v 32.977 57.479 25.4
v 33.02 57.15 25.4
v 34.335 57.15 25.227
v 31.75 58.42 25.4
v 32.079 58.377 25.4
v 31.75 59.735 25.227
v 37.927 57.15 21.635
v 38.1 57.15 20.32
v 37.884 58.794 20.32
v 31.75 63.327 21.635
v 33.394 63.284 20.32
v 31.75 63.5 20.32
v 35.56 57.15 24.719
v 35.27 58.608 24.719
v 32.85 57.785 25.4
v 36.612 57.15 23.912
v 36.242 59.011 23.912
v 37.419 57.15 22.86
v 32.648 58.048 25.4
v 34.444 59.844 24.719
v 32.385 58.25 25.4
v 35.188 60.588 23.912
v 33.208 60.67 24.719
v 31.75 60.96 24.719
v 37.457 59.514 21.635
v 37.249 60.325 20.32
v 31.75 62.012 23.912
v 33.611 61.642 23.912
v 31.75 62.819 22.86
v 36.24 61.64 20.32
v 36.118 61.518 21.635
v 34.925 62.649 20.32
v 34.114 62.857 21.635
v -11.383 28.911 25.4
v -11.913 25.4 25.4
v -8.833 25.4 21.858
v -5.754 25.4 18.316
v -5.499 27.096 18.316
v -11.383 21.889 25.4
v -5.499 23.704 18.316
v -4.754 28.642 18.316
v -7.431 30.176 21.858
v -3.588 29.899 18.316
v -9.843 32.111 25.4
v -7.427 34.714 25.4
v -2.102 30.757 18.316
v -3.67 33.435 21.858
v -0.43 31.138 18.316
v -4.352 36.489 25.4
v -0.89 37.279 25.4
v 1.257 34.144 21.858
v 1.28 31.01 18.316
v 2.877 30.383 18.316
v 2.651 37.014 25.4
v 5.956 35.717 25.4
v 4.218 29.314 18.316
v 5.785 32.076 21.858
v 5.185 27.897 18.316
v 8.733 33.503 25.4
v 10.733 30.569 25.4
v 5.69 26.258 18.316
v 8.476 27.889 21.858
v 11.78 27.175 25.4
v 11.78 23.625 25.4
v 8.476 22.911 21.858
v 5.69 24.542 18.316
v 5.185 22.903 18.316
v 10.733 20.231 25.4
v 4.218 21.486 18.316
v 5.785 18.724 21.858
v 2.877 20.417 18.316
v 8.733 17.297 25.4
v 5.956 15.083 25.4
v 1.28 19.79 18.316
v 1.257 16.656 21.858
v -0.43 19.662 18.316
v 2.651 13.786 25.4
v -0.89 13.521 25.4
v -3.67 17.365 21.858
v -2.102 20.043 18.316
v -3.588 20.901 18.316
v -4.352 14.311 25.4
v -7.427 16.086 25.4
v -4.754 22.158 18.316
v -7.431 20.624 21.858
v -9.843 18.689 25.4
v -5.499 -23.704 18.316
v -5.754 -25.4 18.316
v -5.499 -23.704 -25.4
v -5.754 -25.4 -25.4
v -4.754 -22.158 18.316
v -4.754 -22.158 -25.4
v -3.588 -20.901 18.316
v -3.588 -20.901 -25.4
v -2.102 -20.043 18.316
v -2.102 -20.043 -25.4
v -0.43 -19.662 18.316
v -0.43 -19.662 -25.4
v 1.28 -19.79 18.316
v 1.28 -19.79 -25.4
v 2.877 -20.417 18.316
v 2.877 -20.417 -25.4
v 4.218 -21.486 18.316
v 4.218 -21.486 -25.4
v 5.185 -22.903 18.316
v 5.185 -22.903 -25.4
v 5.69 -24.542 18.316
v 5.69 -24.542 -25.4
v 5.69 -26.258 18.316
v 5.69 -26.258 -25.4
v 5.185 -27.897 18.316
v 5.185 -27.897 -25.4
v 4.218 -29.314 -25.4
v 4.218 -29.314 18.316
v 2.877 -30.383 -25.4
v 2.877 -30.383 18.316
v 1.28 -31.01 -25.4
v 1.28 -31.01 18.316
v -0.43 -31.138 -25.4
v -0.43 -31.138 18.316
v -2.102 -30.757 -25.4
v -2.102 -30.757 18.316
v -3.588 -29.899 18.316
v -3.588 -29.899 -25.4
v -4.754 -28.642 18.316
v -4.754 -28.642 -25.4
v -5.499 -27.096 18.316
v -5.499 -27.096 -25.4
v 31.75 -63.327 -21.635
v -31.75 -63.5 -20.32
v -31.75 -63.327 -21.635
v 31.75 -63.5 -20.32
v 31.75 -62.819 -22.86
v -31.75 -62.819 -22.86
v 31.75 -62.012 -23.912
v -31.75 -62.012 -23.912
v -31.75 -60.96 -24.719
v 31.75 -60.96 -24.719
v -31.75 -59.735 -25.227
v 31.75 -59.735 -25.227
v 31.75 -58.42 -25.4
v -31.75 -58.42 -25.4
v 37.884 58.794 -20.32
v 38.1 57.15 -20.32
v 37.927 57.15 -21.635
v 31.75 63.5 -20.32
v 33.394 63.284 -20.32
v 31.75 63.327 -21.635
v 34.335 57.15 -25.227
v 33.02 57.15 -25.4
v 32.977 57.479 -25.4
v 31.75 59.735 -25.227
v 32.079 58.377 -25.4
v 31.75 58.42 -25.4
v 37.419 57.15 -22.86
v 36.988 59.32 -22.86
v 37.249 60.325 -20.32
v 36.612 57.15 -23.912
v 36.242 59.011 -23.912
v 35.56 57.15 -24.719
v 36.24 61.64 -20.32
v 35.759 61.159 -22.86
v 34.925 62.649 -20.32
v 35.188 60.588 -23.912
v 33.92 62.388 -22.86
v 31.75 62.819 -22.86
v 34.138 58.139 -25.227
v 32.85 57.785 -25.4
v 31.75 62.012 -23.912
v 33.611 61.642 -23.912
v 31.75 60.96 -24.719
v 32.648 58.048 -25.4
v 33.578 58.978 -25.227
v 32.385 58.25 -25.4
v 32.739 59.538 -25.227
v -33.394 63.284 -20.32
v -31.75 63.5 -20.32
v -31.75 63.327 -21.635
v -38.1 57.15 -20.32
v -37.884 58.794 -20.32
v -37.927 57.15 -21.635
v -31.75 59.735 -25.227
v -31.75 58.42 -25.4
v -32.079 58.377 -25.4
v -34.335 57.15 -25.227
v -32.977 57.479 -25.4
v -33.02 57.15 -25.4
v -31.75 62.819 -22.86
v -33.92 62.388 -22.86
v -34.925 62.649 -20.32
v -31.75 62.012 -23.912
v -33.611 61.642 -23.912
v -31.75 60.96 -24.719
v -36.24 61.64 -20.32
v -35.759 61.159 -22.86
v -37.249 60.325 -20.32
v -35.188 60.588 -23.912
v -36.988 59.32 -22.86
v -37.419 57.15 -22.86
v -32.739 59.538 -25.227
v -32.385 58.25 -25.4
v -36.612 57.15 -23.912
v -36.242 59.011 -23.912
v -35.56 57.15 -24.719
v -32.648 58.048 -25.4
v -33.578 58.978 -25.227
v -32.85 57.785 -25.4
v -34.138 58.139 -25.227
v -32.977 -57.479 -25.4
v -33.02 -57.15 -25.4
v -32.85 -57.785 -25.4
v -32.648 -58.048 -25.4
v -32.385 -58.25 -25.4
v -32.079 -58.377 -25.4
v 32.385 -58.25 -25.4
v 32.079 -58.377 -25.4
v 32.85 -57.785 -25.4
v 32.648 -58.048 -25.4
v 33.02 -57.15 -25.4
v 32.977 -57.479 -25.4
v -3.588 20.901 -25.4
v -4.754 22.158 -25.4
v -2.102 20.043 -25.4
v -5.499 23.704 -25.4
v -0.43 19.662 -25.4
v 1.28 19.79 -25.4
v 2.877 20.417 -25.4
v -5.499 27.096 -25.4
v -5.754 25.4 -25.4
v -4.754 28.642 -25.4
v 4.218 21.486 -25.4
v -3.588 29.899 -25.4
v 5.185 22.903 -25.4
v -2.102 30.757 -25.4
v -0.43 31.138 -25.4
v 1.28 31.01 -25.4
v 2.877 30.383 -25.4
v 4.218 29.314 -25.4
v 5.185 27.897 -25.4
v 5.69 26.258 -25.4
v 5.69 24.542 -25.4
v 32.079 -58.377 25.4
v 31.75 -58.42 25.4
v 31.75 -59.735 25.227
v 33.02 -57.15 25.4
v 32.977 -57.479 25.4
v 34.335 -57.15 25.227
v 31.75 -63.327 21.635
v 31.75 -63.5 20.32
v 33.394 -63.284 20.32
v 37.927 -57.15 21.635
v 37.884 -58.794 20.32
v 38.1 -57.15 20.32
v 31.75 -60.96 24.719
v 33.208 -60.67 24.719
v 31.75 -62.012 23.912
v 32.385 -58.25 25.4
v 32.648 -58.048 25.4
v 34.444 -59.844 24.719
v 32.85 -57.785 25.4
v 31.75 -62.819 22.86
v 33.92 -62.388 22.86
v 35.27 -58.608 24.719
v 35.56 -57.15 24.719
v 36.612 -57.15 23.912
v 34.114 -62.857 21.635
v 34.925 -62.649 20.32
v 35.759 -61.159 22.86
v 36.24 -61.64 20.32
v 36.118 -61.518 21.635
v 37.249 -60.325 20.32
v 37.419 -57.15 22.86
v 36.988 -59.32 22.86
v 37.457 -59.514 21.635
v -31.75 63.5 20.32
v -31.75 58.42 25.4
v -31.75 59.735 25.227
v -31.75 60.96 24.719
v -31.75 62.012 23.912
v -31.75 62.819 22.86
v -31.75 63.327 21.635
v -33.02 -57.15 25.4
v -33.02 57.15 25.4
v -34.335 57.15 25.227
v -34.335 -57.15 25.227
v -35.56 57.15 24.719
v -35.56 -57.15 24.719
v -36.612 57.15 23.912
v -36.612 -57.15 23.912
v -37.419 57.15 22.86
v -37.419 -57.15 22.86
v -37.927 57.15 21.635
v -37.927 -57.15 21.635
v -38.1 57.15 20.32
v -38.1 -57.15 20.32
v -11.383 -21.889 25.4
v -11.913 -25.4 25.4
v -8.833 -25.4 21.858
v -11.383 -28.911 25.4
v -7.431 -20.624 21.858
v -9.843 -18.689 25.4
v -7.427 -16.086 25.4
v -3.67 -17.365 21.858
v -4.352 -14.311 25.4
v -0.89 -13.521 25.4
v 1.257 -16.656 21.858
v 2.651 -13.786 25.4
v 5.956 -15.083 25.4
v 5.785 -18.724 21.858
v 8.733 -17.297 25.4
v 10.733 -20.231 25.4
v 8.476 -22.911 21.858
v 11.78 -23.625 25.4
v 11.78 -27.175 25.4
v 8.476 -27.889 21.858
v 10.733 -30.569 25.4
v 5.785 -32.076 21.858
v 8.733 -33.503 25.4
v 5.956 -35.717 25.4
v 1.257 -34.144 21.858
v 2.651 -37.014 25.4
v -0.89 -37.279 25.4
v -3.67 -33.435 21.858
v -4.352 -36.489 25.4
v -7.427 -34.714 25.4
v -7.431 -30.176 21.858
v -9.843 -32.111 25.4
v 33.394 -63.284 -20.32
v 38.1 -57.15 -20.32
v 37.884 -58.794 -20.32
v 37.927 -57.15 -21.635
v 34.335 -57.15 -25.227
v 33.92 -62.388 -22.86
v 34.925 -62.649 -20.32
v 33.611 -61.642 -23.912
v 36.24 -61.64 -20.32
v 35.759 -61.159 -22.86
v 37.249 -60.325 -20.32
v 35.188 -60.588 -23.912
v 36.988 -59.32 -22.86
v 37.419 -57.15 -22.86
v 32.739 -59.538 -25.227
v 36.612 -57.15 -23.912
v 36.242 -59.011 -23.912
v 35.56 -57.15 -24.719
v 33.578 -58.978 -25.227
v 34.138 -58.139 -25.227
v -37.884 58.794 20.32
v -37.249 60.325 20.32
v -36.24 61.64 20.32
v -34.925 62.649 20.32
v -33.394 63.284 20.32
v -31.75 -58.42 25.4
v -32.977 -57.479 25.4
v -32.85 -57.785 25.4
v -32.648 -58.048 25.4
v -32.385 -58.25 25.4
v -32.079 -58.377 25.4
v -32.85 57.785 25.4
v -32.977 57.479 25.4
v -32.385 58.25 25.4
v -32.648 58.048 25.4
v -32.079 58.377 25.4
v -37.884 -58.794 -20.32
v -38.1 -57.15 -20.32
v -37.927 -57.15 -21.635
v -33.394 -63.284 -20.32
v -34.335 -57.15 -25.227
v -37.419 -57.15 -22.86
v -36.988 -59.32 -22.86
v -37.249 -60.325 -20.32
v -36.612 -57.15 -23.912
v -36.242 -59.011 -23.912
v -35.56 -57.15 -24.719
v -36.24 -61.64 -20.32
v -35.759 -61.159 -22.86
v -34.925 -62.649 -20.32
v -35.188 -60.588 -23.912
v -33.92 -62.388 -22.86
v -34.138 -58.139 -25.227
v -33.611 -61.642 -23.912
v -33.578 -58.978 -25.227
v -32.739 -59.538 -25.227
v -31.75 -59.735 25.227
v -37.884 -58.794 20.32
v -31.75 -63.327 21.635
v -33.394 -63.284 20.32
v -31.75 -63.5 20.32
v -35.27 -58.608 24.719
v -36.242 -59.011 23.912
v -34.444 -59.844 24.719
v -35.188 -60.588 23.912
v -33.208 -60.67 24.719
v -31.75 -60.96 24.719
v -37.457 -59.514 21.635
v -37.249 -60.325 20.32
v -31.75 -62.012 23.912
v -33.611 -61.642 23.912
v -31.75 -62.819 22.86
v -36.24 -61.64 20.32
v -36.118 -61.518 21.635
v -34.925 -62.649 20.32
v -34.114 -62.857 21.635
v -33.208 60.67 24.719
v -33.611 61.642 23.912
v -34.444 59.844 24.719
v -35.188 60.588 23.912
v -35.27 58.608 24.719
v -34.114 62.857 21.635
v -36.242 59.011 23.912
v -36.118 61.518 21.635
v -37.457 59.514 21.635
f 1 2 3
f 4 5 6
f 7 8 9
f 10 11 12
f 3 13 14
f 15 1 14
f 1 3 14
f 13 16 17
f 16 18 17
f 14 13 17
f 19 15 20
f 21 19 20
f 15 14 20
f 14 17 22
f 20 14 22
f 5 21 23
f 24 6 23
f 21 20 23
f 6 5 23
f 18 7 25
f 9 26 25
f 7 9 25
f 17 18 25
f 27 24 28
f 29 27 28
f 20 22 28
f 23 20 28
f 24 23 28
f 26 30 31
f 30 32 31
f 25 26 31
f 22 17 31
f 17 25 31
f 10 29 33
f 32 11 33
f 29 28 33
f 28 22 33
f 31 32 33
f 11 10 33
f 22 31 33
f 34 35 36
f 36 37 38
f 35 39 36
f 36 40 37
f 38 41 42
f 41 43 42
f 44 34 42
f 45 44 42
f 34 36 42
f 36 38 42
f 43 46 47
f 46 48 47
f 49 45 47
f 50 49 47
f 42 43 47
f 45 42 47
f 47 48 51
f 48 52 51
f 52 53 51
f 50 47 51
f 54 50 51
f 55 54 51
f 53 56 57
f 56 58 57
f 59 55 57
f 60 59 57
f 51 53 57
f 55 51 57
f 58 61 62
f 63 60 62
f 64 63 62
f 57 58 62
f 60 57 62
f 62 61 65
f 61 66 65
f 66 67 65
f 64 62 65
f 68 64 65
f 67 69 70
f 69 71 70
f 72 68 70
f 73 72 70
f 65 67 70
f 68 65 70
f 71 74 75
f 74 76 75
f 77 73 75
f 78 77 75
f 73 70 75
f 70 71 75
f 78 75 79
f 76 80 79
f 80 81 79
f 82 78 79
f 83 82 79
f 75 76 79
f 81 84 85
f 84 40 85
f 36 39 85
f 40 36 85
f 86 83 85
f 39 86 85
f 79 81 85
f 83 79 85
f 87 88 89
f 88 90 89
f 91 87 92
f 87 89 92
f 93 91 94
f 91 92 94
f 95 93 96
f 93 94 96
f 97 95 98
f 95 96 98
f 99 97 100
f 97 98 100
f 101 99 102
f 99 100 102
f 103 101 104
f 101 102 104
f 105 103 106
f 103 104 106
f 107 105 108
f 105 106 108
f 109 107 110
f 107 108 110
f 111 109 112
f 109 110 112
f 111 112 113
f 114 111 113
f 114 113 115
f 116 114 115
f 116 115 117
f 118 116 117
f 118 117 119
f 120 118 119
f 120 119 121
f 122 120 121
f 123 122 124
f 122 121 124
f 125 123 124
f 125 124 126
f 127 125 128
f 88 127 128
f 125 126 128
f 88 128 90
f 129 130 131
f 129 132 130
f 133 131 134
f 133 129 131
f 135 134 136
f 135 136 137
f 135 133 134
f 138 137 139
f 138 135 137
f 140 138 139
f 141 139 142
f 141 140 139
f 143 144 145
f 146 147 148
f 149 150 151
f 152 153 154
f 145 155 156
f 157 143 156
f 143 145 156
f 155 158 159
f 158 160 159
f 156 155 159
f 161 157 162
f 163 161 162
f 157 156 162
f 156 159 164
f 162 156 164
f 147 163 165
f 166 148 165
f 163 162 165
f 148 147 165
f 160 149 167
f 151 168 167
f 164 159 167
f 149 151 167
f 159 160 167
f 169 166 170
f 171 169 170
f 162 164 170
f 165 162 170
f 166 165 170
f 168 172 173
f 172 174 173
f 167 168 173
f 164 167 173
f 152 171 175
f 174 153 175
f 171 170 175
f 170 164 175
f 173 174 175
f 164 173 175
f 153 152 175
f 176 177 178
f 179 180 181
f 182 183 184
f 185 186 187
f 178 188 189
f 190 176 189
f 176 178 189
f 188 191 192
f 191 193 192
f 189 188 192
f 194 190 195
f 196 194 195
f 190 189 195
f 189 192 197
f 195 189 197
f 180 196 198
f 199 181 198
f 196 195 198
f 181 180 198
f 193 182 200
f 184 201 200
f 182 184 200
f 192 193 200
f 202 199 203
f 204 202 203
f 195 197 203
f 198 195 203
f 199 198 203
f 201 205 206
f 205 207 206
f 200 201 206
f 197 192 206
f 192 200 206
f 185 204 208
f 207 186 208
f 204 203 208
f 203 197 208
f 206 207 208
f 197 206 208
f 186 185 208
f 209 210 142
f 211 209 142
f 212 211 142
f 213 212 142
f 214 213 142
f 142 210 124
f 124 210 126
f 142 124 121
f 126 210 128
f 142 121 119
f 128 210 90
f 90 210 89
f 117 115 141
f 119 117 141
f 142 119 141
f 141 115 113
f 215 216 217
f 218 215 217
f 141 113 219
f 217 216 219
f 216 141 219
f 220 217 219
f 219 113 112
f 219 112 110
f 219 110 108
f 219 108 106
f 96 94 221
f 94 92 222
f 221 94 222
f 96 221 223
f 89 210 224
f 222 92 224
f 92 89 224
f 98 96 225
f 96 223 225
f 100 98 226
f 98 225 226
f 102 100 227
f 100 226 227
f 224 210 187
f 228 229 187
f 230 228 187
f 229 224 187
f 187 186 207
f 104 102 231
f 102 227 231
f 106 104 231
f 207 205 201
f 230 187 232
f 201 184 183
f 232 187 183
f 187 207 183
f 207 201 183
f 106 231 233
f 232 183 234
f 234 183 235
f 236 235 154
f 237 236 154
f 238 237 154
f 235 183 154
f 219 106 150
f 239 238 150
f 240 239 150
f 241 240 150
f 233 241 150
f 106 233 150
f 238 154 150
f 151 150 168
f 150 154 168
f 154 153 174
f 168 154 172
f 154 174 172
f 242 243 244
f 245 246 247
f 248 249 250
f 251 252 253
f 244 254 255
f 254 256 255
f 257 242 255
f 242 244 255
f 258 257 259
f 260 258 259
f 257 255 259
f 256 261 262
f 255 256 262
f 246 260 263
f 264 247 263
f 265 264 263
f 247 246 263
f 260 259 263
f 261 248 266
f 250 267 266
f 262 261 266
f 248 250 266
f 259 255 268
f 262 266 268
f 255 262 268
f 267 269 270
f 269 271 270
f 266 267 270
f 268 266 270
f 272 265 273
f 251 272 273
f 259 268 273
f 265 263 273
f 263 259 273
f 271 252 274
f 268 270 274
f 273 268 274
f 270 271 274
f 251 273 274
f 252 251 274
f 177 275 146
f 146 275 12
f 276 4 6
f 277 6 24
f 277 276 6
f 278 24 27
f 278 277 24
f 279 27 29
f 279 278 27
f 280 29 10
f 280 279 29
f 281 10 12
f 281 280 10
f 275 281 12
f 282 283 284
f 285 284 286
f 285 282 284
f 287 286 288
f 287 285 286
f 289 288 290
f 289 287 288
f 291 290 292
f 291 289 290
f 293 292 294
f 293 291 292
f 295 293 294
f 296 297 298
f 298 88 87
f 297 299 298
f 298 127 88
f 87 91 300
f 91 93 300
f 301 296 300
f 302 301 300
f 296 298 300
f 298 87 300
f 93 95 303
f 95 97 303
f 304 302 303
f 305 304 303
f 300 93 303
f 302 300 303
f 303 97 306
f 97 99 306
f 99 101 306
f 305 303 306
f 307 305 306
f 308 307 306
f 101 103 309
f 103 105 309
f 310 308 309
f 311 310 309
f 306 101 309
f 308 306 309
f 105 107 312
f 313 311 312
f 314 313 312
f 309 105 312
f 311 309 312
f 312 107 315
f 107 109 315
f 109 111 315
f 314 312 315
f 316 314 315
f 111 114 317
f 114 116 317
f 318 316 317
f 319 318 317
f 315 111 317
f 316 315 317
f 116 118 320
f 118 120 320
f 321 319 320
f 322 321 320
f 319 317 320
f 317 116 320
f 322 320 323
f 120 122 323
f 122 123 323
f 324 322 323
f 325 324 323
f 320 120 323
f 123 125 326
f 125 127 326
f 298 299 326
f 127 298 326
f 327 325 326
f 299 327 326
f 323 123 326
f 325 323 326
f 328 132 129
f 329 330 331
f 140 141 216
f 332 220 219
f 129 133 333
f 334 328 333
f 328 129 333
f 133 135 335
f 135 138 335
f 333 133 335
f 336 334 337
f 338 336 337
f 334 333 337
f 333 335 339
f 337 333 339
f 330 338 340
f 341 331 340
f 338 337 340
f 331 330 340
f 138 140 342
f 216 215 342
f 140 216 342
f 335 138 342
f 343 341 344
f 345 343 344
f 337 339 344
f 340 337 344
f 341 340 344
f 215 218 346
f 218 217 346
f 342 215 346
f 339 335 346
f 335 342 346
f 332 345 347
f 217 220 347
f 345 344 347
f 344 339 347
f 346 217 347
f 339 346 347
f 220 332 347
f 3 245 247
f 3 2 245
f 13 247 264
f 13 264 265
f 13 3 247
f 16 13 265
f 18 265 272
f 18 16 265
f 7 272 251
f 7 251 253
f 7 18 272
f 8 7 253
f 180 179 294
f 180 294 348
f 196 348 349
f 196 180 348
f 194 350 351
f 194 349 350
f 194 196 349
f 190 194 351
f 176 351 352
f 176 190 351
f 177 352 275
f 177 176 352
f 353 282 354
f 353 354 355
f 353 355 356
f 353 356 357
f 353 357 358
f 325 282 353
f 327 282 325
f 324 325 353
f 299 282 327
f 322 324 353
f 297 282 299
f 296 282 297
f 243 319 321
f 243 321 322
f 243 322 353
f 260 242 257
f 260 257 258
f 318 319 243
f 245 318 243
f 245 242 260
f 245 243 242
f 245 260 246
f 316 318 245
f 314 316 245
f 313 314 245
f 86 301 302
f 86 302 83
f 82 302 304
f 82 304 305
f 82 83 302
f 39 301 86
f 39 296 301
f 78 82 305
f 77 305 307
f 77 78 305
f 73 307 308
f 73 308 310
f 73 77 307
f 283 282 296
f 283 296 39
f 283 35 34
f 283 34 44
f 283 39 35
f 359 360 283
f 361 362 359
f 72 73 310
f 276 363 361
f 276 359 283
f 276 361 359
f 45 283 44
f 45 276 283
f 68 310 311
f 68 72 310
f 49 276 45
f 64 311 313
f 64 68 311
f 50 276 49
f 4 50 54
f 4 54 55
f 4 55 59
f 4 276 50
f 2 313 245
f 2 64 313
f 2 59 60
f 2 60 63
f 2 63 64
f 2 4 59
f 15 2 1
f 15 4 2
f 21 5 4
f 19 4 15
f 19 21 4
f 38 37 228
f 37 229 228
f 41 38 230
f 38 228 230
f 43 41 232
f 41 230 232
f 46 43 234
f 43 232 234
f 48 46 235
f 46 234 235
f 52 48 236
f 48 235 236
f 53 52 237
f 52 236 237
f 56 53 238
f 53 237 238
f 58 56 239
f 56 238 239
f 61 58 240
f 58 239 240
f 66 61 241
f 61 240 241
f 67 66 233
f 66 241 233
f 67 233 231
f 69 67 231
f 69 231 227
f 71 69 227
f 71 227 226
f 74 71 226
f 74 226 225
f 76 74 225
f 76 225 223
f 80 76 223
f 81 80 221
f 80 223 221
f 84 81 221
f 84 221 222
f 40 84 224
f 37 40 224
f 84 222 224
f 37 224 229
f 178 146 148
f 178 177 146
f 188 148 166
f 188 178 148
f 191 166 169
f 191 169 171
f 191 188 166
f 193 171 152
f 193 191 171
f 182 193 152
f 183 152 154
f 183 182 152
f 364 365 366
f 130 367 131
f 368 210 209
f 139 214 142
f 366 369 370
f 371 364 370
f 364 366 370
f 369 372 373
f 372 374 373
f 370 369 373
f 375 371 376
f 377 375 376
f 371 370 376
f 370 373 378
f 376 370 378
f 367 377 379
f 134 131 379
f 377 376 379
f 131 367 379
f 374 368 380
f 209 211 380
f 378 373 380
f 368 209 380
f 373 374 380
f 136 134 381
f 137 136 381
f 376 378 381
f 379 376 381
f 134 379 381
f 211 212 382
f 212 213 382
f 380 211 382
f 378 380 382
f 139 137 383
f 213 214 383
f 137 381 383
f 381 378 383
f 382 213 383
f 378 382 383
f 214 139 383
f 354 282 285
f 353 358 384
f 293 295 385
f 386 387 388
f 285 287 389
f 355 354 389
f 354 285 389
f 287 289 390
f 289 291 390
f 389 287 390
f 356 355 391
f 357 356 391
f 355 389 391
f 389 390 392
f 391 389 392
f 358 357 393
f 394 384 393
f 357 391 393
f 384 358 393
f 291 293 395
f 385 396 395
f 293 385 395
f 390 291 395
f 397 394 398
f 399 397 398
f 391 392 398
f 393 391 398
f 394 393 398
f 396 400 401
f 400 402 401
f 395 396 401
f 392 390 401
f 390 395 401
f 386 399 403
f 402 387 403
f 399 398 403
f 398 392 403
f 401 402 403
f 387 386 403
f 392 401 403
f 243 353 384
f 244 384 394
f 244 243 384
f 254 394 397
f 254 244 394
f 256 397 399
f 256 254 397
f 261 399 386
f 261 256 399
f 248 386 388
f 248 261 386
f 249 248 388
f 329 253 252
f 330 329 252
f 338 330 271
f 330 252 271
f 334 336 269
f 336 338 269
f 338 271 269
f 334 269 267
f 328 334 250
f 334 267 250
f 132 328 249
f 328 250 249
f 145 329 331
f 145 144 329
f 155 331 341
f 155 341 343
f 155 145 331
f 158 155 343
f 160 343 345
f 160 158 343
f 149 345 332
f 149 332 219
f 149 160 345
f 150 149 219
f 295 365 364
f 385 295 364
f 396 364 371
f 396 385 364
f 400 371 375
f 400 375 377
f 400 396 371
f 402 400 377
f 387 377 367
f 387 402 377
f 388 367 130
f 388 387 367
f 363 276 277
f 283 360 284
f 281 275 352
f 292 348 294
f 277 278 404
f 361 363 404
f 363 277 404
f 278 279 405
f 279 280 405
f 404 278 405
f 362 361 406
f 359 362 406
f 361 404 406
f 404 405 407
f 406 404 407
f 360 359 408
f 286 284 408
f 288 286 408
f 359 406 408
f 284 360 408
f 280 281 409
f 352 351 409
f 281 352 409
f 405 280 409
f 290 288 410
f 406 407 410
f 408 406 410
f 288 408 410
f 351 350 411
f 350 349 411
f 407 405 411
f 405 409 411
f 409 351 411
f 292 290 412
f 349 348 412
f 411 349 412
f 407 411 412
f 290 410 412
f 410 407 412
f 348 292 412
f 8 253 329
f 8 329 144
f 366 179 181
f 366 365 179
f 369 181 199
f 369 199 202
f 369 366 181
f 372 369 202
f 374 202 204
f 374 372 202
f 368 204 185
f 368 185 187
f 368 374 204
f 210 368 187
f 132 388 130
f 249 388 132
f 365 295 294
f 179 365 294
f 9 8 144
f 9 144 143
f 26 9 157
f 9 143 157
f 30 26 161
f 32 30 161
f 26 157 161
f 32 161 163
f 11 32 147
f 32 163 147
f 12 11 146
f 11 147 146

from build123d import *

# Parameters (mm, degrees)
F0_W           = 76.2
F0_H           = 127
F1_DEPTH       = 25.4
F2_R           = 6.35
F4_D           = 11.50874
F4_CSINK_D     = 23.8252
F4_CSINK_ANGLE = 82
F5_R           = 5.08


with BuildPart() as f1:
    # F0 (on Top) → F1 (new body, symmetric)
    with BuildSketch(Plane.XY):
        Rectangle(F0_W, F0_H)
    extrude(amount=F1_DEPTH, both=True)

    # F2
    f2_edges = [f1.edges().sort_by_distance(p)[0] for p in [
        (38.1, -63.5, 0),
        (38.1, 63.5, 0),
        (-38.1, -63.5, 0),
        (-38.1, 63.5, 0),
    ]]
    fillet(f2_edges, radius=F2_R)

    # F4 (through all)
    with Locations(Plane.XY.offset(25.4)):
        with Locations((0, -25.4), (0, 25.4)):
            CounterSinkHole(F4_D / 2, F4_CSINK_D / 2, counter_sink_angle=F4_CSINK_ANGLE)

    # F5
    f5_edges = [f1.edges().sort_by_distance(p)[0] for p in [
        (38.1, 0, 25.4),
        (38.1, 0, -25.4),
    ]]
    fillet(f5_edges, radius=F5_R)


solid = f1.part
